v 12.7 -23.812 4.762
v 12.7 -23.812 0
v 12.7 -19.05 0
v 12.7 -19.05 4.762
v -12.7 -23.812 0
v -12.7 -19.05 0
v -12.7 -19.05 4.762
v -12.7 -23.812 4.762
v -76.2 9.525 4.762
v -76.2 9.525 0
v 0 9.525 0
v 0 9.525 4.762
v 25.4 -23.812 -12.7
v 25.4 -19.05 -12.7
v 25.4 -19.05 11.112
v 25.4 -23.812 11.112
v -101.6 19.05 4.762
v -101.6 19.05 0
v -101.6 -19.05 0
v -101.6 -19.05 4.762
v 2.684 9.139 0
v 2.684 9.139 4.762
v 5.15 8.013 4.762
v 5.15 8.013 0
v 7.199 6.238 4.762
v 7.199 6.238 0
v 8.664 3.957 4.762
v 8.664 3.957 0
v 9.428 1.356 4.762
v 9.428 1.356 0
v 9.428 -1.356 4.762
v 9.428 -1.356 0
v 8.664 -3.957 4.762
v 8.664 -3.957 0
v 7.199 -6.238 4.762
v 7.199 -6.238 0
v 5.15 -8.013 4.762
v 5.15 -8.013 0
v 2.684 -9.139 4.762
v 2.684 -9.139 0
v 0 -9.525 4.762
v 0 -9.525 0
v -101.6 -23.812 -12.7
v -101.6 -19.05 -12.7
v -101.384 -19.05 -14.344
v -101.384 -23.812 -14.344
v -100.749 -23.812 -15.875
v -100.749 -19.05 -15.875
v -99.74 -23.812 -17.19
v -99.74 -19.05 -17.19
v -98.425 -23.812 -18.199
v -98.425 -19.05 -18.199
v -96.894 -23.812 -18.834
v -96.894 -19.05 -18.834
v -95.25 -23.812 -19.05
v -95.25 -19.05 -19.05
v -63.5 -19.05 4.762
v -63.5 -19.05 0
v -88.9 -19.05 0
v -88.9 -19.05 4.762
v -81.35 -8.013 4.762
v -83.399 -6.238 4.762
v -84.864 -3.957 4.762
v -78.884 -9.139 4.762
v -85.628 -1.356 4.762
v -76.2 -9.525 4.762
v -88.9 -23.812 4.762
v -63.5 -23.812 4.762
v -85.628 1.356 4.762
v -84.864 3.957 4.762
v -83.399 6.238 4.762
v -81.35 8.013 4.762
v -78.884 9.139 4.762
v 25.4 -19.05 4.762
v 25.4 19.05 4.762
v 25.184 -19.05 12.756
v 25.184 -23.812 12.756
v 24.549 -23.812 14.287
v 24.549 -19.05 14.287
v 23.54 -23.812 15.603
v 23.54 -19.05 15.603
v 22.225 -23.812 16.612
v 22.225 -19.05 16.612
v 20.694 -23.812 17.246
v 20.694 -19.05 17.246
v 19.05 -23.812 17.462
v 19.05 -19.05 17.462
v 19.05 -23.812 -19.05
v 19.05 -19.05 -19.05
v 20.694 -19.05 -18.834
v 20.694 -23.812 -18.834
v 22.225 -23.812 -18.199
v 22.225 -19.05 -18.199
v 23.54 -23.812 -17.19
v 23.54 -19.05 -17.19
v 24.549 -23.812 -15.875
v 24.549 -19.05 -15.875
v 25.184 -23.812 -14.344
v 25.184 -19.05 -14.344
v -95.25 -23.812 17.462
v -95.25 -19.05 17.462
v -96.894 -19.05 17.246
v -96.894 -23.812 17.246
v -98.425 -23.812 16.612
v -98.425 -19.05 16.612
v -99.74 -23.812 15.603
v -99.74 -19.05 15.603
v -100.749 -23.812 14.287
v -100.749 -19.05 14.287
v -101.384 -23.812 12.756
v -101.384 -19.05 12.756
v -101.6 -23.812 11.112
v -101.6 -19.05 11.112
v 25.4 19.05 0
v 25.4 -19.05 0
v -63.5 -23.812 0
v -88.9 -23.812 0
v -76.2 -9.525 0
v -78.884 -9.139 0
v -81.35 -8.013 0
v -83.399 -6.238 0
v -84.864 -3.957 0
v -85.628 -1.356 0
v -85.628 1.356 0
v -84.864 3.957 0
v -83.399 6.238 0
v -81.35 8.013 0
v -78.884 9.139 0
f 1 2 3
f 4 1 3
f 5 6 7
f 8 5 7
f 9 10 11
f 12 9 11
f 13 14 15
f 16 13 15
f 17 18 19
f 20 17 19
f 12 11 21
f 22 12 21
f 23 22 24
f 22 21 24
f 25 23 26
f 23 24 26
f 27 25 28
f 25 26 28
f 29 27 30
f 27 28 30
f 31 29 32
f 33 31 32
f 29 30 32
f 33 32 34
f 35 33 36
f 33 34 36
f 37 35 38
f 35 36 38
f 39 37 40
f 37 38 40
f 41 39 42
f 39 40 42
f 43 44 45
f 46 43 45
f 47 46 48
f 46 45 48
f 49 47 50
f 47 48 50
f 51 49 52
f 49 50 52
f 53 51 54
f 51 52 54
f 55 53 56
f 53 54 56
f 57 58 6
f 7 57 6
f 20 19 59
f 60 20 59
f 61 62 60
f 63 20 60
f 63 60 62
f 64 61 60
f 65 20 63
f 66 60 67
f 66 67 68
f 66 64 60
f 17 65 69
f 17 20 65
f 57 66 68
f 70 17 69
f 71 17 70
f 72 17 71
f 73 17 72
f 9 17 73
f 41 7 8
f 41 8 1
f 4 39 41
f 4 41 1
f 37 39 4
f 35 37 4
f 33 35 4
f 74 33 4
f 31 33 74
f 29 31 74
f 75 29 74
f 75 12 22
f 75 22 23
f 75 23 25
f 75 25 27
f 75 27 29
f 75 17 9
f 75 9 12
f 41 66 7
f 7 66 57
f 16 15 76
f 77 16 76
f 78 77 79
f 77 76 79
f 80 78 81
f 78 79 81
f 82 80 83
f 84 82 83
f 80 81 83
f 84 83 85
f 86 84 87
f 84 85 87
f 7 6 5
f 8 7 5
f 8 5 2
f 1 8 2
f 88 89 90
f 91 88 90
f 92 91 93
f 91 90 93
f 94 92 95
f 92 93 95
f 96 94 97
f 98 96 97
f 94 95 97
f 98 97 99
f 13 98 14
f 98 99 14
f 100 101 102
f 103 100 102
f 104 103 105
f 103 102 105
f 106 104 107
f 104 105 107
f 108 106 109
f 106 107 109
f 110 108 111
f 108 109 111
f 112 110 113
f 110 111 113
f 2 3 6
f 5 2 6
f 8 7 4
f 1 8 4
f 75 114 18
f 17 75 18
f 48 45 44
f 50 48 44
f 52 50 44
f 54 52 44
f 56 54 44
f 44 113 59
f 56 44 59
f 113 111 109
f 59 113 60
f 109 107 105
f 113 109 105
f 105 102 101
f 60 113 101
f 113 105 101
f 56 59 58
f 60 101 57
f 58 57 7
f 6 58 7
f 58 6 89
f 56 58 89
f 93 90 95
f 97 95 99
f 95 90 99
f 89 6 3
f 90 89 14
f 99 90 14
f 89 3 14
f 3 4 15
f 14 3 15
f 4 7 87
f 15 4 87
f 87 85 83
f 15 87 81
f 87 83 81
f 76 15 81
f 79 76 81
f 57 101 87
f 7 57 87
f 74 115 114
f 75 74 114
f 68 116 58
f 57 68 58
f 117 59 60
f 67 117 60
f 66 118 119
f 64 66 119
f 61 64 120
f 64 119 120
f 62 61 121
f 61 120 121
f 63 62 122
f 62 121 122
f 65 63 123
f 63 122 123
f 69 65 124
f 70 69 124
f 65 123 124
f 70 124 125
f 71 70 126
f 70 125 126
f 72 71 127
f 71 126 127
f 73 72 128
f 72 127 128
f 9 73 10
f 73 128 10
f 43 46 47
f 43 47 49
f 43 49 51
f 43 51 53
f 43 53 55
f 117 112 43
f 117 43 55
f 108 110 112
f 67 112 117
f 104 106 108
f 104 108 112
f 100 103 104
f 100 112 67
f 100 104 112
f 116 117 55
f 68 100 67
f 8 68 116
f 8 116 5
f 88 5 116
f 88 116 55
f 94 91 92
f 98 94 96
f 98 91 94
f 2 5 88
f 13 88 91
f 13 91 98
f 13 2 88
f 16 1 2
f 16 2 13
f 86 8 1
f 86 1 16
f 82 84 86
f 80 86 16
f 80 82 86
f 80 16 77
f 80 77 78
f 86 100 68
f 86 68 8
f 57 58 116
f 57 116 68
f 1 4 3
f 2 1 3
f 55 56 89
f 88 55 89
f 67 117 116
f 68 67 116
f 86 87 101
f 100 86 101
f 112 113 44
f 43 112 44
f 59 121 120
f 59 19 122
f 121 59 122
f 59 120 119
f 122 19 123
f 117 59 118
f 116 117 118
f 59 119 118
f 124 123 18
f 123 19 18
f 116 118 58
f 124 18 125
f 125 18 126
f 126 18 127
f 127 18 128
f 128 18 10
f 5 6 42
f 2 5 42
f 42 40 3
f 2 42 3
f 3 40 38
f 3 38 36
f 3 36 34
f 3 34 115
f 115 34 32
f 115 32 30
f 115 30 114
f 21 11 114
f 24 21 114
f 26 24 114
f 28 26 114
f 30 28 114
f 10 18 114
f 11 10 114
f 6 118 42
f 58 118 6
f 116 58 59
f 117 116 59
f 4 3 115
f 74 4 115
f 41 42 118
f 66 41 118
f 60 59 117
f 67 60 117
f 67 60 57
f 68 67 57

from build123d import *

# Parameters (mm, degrees)
F1_DEPTH = 4.7625
F2_W     = 50.8
F2_H     = 4.7625
F3_DEPTH = 4.7625


with BuildPart() as f1:
    # F0 (on Top) → F1 (new body)
    with BuildSketch(Plane.XY):
        Polygon((25.4, 19.05), (-101.6, 19.05), (-101.6, -19.05), (-88.9, -19.05), (-88.9, -23.8125), (-63.5, -23.8125), (-63.5, -19.05), (-12.7, -19.05), (-12.7, -23.8125), (12.7, -23.8125), (12.7, -19.05), (25.4, -19.05), align=None)
        with BuildLine():
            ThreePointArc((-76.2, -9.525), (-85.725, 0), (-76.2, 9.525))
            Line((-76.2, 9.525), (0, 9.525))
            ThreePointArc((0, 9.525), (9.525, 0), (0, -9.525))
            Line((0, -9.525), (-76.2, -9.525))
        make_face(mode=Mode.SUBTRACT)
    extrude(amount=F1_DEPTH)


with BuildPart() as f3:
    # F2 (on face) → F3 (new body)
    with BuildSketch(Plane.XZ.offset(19.05)):
        with BuildLine():
            ThreePointArc((-95.25, 17.4625), (-99.7401280605, 15.6026280605), (-101.6, 11.1125))
            Line((-101.6, 11.1125), (-101.6, -12.7))
            ThreePointArc((-101.6, -12.7), (-99.7401280605, -17.1901280605), (-95.25, -19.05))
            Line((-95.25, -19.05), (19.05, -19.05))
            ThreePointArc((19.05, -19.05), (23.5401280605, -17.1901280605), (25.4, -12.7))
            Line((25.4, -12.7), (25.4, 11.1125))
            ThreePointArc((25.4, 11.1125), (23.5401280605, 15.6026280605), (19.05, 17.4625))
            Line((19.05, 17.4625), (-95.25, 17.4625))
        make_face()
        Polygon((-63.5, 0), (-88.9, 0), (-88.9, 4.7625), (-63.5, 4.7625), (-12.7, 4.7625), (12.7, 4.7625), (12.7, 0), (-12.7, 0), align=None, mode=Mode.SUBTRACT)
        with Locations((-38.1, 2.38125)):
            Rectangle(F2_W, F2_H)
    extrude(amount=F3_DEPTH)


solid = Compound([f1.part, f3.part])
